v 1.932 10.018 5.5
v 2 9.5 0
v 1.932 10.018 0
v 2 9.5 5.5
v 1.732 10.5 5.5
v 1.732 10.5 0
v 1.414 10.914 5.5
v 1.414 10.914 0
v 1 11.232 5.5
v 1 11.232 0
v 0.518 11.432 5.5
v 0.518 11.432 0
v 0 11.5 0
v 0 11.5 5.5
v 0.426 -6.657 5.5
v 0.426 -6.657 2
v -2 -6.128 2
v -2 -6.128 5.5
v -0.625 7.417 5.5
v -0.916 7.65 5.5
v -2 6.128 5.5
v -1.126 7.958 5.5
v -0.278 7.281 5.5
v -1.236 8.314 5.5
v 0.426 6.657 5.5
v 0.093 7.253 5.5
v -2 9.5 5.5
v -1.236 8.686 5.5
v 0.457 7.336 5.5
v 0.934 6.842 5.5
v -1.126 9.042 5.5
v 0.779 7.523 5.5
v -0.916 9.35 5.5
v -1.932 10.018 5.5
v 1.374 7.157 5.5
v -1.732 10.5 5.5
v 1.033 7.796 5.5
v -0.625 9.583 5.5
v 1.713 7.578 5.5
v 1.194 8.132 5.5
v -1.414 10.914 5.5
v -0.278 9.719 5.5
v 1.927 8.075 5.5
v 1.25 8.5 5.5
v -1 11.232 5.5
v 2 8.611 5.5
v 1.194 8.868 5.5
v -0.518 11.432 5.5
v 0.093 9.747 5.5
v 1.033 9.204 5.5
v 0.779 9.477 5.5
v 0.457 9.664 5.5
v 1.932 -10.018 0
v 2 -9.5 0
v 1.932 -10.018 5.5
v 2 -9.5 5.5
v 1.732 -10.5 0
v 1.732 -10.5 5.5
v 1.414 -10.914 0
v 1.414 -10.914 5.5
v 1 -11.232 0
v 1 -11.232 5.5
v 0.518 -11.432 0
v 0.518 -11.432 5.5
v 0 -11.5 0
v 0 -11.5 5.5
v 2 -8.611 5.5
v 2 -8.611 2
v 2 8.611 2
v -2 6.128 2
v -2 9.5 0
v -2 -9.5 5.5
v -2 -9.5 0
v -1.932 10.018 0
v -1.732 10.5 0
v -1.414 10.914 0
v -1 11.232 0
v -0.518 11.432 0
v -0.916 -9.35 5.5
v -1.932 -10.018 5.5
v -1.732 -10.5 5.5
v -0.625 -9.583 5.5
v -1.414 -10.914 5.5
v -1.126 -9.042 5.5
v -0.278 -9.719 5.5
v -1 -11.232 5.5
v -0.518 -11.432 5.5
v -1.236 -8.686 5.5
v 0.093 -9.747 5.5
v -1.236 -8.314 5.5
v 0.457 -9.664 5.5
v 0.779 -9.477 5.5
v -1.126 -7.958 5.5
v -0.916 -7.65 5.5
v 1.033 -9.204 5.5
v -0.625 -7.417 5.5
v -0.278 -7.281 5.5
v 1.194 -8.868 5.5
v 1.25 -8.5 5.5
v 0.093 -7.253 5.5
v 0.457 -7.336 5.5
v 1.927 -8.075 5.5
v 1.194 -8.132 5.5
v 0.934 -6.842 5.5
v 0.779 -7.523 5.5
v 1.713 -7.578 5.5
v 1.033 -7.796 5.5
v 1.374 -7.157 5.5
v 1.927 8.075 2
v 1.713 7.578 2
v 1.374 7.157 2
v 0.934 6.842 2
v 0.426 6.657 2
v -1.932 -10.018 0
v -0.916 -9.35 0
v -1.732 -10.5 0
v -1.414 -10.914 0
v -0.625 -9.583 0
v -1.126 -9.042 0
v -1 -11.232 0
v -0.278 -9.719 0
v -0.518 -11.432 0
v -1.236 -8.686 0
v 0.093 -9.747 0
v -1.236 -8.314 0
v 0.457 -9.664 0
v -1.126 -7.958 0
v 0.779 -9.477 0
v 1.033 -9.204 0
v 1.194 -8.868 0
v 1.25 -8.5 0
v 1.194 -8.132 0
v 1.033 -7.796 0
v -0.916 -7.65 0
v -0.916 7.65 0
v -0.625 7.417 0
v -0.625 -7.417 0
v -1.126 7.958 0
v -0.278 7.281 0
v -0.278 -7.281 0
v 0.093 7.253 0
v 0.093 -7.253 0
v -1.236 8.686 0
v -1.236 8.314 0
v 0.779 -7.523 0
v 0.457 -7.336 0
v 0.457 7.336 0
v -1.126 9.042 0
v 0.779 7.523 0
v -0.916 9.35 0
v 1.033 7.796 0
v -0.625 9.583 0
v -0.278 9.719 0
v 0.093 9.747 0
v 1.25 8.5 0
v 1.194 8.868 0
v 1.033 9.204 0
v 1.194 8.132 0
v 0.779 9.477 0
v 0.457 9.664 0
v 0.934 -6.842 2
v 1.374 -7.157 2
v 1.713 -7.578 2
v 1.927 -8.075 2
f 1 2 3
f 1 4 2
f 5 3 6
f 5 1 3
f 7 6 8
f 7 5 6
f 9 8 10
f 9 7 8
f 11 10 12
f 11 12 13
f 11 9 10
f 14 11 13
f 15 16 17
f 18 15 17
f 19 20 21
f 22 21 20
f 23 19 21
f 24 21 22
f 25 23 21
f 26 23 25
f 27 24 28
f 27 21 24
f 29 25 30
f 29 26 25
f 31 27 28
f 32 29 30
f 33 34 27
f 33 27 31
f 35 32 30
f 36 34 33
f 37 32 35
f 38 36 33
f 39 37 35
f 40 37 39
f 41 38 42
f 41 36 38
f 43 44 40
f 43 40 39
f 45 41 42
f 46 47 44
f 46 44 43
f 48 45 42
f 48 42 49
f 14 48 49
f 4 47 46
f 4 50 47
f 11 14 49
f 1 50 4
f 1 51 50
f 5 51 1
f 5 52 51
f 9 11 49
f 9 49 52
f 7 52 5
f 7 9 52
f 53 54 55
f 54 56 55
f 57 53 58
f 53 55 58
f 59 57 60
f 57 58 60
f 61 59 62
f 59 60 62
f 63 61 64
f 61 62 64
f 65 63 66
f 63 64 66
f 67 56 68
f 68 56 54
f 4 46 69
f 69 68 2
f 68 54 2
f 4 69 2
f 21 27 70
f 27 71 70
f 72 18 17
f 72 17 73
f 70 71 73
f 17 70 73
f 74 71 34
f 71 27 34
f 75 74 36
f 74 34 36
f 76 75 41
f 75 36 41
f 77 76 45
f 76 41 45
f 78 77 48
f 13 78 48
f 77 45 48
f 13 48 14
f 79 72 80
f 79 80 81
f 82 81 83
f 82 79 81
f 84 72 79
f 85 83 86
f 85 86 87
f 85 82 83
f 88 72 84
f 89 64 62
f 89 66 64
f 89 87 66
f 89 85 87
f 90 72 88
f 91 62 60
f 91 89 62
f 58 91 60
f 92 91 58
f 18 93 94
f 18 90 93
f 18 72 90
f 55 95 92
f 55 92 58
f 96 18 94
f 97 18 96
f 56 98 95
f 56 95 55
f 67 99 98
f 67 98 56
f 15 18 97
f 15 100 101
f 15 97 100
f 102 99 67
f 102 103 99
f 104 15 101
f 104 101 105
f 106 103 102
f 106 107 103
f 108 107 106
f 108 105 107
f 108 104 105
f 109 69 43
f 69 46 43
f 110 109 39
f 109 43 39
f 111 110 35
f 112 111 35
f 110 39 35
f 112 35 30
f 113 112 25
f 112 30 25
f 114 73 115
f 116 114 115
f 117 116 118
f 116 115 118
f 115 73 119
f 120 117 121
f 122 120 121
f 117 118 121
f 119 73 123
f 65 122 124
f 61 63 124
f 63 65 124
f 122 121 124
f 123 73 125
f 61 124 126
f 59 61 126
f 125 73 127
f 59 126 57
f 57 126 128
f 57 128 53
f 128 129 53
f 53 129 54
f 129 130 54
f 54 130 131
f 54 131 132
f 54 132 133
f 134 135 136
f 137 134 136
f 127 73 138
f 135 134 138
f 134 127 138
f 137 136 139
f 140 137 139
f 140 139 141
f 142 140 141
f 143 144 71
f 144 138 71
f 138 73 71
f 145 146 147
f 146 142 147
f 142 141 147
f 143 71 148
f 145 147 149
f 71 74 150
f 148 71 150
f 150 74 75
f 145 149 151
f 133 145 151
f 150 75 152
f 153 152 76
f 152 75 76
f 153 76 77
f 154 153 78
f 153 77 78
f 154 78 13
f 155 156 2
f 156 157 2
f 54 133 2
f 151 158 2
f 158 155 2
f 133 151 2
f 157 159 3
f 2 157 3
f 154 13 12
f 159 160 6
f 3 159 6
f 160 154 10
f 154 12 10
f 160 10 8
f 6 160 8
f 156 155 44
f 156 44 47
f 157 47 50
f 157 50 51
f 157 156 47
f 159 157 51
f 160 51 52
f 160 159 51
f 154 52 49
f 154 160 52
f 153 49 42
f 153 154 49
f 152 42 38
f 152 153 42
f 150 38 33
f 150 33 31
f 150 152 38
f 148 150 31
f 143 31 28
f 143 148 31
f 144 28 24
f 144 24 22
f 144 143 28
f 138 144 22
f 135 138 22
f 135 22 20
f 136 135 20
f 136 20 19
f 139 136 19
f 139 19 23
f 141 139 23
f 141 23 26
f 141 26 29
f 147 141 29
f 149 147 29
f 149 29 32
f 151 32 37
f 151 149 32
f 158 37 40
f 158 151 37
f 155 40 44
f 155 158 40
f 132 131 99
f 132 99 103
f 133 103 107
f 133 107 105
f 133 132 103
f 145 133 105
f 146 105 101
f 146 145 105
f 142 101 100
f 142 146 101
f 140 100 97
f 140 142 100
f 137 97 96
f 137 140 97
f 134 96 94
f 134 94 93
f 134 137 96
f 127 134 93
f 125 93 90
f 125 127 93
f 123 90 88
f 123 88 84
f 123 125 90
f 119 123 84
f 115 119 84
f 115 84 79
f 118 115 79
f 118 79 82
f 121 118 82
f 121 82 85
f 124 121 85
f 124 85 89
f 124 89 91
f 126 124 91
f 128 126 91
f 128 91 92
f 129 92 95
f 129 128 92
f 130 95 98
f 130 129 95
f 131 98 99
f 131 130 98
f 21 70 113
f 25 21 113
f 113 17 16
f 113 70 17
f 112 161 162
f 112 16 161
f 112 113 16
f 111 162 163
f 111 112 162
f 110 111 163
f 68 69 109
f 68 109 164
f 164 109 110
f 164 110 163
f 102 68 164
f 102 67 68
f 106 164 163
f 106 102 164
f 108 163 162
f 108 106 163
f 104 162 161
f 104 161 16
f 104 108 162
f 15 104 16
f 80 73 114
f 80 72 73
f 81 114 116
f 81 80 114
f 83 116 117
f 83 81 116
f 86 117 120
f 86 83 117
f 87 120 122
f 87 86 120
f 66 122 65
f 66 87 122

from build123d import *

# Parameters (mm, degrees)
F1_DEPTH = 2
F0_R     = 1.25
F2_DEPTH = 5.5
F3_R     = 1.99999


# Not quite as in the source:
# - a fillet or chamfer is up to 0.001 mm smaller than in the source, because OpenCascade refuses the exact size
# - a feature names something its author has since deleted; it is built from what else it names


with BuildPart() as f1:
    # F0 (on Top) → F1 (new body)
    with BuildSketch(Plane.XY):
        Polygon((-2, 6.1276243068), (-2, -6.1276243068), (2, -7), (2, 7), align=None)
    extrude(amount=F1_DEPTH)

    # F0 (on Top) → F2 (join)
    with BuildSketch(Plane.XY):
        Polygon((-2, 11.5), (-2, 6.1276243068), (2, 7), (2, 11.5), align=None)
        with Locations((0, 8.5)):
            Circle(F0_R, mode=Mode.SUBTRACT)
        Polygon((-2, -11.5), (2, -11.5), (2, -8.2029914483), (2, -7), (-2, -6.1276243068), align=None)
        with Locations((0, -8.5)):
            Circle(F0_R, mode=Mode.SUBTRACT)
    extrude(amount=F2_DEPTH)

    # F3 (radius 2 in the source; OpenCascade refuses exactly that, so slightly less here)
    f3_edges = [f1.edges().sort_by_distance(p)[0] for p in [
        (2, 11.5, 2.75),
        (-2, 11.5, 2.75),
        (2, -11.5, 2.75),
        (-2, -11.5, 2.75),
        (2, -7, 3.75),
        (2, 7, 3.75),
    ]]
    fillet(f3_edges, radius=F3_R)


solid = f1.part
